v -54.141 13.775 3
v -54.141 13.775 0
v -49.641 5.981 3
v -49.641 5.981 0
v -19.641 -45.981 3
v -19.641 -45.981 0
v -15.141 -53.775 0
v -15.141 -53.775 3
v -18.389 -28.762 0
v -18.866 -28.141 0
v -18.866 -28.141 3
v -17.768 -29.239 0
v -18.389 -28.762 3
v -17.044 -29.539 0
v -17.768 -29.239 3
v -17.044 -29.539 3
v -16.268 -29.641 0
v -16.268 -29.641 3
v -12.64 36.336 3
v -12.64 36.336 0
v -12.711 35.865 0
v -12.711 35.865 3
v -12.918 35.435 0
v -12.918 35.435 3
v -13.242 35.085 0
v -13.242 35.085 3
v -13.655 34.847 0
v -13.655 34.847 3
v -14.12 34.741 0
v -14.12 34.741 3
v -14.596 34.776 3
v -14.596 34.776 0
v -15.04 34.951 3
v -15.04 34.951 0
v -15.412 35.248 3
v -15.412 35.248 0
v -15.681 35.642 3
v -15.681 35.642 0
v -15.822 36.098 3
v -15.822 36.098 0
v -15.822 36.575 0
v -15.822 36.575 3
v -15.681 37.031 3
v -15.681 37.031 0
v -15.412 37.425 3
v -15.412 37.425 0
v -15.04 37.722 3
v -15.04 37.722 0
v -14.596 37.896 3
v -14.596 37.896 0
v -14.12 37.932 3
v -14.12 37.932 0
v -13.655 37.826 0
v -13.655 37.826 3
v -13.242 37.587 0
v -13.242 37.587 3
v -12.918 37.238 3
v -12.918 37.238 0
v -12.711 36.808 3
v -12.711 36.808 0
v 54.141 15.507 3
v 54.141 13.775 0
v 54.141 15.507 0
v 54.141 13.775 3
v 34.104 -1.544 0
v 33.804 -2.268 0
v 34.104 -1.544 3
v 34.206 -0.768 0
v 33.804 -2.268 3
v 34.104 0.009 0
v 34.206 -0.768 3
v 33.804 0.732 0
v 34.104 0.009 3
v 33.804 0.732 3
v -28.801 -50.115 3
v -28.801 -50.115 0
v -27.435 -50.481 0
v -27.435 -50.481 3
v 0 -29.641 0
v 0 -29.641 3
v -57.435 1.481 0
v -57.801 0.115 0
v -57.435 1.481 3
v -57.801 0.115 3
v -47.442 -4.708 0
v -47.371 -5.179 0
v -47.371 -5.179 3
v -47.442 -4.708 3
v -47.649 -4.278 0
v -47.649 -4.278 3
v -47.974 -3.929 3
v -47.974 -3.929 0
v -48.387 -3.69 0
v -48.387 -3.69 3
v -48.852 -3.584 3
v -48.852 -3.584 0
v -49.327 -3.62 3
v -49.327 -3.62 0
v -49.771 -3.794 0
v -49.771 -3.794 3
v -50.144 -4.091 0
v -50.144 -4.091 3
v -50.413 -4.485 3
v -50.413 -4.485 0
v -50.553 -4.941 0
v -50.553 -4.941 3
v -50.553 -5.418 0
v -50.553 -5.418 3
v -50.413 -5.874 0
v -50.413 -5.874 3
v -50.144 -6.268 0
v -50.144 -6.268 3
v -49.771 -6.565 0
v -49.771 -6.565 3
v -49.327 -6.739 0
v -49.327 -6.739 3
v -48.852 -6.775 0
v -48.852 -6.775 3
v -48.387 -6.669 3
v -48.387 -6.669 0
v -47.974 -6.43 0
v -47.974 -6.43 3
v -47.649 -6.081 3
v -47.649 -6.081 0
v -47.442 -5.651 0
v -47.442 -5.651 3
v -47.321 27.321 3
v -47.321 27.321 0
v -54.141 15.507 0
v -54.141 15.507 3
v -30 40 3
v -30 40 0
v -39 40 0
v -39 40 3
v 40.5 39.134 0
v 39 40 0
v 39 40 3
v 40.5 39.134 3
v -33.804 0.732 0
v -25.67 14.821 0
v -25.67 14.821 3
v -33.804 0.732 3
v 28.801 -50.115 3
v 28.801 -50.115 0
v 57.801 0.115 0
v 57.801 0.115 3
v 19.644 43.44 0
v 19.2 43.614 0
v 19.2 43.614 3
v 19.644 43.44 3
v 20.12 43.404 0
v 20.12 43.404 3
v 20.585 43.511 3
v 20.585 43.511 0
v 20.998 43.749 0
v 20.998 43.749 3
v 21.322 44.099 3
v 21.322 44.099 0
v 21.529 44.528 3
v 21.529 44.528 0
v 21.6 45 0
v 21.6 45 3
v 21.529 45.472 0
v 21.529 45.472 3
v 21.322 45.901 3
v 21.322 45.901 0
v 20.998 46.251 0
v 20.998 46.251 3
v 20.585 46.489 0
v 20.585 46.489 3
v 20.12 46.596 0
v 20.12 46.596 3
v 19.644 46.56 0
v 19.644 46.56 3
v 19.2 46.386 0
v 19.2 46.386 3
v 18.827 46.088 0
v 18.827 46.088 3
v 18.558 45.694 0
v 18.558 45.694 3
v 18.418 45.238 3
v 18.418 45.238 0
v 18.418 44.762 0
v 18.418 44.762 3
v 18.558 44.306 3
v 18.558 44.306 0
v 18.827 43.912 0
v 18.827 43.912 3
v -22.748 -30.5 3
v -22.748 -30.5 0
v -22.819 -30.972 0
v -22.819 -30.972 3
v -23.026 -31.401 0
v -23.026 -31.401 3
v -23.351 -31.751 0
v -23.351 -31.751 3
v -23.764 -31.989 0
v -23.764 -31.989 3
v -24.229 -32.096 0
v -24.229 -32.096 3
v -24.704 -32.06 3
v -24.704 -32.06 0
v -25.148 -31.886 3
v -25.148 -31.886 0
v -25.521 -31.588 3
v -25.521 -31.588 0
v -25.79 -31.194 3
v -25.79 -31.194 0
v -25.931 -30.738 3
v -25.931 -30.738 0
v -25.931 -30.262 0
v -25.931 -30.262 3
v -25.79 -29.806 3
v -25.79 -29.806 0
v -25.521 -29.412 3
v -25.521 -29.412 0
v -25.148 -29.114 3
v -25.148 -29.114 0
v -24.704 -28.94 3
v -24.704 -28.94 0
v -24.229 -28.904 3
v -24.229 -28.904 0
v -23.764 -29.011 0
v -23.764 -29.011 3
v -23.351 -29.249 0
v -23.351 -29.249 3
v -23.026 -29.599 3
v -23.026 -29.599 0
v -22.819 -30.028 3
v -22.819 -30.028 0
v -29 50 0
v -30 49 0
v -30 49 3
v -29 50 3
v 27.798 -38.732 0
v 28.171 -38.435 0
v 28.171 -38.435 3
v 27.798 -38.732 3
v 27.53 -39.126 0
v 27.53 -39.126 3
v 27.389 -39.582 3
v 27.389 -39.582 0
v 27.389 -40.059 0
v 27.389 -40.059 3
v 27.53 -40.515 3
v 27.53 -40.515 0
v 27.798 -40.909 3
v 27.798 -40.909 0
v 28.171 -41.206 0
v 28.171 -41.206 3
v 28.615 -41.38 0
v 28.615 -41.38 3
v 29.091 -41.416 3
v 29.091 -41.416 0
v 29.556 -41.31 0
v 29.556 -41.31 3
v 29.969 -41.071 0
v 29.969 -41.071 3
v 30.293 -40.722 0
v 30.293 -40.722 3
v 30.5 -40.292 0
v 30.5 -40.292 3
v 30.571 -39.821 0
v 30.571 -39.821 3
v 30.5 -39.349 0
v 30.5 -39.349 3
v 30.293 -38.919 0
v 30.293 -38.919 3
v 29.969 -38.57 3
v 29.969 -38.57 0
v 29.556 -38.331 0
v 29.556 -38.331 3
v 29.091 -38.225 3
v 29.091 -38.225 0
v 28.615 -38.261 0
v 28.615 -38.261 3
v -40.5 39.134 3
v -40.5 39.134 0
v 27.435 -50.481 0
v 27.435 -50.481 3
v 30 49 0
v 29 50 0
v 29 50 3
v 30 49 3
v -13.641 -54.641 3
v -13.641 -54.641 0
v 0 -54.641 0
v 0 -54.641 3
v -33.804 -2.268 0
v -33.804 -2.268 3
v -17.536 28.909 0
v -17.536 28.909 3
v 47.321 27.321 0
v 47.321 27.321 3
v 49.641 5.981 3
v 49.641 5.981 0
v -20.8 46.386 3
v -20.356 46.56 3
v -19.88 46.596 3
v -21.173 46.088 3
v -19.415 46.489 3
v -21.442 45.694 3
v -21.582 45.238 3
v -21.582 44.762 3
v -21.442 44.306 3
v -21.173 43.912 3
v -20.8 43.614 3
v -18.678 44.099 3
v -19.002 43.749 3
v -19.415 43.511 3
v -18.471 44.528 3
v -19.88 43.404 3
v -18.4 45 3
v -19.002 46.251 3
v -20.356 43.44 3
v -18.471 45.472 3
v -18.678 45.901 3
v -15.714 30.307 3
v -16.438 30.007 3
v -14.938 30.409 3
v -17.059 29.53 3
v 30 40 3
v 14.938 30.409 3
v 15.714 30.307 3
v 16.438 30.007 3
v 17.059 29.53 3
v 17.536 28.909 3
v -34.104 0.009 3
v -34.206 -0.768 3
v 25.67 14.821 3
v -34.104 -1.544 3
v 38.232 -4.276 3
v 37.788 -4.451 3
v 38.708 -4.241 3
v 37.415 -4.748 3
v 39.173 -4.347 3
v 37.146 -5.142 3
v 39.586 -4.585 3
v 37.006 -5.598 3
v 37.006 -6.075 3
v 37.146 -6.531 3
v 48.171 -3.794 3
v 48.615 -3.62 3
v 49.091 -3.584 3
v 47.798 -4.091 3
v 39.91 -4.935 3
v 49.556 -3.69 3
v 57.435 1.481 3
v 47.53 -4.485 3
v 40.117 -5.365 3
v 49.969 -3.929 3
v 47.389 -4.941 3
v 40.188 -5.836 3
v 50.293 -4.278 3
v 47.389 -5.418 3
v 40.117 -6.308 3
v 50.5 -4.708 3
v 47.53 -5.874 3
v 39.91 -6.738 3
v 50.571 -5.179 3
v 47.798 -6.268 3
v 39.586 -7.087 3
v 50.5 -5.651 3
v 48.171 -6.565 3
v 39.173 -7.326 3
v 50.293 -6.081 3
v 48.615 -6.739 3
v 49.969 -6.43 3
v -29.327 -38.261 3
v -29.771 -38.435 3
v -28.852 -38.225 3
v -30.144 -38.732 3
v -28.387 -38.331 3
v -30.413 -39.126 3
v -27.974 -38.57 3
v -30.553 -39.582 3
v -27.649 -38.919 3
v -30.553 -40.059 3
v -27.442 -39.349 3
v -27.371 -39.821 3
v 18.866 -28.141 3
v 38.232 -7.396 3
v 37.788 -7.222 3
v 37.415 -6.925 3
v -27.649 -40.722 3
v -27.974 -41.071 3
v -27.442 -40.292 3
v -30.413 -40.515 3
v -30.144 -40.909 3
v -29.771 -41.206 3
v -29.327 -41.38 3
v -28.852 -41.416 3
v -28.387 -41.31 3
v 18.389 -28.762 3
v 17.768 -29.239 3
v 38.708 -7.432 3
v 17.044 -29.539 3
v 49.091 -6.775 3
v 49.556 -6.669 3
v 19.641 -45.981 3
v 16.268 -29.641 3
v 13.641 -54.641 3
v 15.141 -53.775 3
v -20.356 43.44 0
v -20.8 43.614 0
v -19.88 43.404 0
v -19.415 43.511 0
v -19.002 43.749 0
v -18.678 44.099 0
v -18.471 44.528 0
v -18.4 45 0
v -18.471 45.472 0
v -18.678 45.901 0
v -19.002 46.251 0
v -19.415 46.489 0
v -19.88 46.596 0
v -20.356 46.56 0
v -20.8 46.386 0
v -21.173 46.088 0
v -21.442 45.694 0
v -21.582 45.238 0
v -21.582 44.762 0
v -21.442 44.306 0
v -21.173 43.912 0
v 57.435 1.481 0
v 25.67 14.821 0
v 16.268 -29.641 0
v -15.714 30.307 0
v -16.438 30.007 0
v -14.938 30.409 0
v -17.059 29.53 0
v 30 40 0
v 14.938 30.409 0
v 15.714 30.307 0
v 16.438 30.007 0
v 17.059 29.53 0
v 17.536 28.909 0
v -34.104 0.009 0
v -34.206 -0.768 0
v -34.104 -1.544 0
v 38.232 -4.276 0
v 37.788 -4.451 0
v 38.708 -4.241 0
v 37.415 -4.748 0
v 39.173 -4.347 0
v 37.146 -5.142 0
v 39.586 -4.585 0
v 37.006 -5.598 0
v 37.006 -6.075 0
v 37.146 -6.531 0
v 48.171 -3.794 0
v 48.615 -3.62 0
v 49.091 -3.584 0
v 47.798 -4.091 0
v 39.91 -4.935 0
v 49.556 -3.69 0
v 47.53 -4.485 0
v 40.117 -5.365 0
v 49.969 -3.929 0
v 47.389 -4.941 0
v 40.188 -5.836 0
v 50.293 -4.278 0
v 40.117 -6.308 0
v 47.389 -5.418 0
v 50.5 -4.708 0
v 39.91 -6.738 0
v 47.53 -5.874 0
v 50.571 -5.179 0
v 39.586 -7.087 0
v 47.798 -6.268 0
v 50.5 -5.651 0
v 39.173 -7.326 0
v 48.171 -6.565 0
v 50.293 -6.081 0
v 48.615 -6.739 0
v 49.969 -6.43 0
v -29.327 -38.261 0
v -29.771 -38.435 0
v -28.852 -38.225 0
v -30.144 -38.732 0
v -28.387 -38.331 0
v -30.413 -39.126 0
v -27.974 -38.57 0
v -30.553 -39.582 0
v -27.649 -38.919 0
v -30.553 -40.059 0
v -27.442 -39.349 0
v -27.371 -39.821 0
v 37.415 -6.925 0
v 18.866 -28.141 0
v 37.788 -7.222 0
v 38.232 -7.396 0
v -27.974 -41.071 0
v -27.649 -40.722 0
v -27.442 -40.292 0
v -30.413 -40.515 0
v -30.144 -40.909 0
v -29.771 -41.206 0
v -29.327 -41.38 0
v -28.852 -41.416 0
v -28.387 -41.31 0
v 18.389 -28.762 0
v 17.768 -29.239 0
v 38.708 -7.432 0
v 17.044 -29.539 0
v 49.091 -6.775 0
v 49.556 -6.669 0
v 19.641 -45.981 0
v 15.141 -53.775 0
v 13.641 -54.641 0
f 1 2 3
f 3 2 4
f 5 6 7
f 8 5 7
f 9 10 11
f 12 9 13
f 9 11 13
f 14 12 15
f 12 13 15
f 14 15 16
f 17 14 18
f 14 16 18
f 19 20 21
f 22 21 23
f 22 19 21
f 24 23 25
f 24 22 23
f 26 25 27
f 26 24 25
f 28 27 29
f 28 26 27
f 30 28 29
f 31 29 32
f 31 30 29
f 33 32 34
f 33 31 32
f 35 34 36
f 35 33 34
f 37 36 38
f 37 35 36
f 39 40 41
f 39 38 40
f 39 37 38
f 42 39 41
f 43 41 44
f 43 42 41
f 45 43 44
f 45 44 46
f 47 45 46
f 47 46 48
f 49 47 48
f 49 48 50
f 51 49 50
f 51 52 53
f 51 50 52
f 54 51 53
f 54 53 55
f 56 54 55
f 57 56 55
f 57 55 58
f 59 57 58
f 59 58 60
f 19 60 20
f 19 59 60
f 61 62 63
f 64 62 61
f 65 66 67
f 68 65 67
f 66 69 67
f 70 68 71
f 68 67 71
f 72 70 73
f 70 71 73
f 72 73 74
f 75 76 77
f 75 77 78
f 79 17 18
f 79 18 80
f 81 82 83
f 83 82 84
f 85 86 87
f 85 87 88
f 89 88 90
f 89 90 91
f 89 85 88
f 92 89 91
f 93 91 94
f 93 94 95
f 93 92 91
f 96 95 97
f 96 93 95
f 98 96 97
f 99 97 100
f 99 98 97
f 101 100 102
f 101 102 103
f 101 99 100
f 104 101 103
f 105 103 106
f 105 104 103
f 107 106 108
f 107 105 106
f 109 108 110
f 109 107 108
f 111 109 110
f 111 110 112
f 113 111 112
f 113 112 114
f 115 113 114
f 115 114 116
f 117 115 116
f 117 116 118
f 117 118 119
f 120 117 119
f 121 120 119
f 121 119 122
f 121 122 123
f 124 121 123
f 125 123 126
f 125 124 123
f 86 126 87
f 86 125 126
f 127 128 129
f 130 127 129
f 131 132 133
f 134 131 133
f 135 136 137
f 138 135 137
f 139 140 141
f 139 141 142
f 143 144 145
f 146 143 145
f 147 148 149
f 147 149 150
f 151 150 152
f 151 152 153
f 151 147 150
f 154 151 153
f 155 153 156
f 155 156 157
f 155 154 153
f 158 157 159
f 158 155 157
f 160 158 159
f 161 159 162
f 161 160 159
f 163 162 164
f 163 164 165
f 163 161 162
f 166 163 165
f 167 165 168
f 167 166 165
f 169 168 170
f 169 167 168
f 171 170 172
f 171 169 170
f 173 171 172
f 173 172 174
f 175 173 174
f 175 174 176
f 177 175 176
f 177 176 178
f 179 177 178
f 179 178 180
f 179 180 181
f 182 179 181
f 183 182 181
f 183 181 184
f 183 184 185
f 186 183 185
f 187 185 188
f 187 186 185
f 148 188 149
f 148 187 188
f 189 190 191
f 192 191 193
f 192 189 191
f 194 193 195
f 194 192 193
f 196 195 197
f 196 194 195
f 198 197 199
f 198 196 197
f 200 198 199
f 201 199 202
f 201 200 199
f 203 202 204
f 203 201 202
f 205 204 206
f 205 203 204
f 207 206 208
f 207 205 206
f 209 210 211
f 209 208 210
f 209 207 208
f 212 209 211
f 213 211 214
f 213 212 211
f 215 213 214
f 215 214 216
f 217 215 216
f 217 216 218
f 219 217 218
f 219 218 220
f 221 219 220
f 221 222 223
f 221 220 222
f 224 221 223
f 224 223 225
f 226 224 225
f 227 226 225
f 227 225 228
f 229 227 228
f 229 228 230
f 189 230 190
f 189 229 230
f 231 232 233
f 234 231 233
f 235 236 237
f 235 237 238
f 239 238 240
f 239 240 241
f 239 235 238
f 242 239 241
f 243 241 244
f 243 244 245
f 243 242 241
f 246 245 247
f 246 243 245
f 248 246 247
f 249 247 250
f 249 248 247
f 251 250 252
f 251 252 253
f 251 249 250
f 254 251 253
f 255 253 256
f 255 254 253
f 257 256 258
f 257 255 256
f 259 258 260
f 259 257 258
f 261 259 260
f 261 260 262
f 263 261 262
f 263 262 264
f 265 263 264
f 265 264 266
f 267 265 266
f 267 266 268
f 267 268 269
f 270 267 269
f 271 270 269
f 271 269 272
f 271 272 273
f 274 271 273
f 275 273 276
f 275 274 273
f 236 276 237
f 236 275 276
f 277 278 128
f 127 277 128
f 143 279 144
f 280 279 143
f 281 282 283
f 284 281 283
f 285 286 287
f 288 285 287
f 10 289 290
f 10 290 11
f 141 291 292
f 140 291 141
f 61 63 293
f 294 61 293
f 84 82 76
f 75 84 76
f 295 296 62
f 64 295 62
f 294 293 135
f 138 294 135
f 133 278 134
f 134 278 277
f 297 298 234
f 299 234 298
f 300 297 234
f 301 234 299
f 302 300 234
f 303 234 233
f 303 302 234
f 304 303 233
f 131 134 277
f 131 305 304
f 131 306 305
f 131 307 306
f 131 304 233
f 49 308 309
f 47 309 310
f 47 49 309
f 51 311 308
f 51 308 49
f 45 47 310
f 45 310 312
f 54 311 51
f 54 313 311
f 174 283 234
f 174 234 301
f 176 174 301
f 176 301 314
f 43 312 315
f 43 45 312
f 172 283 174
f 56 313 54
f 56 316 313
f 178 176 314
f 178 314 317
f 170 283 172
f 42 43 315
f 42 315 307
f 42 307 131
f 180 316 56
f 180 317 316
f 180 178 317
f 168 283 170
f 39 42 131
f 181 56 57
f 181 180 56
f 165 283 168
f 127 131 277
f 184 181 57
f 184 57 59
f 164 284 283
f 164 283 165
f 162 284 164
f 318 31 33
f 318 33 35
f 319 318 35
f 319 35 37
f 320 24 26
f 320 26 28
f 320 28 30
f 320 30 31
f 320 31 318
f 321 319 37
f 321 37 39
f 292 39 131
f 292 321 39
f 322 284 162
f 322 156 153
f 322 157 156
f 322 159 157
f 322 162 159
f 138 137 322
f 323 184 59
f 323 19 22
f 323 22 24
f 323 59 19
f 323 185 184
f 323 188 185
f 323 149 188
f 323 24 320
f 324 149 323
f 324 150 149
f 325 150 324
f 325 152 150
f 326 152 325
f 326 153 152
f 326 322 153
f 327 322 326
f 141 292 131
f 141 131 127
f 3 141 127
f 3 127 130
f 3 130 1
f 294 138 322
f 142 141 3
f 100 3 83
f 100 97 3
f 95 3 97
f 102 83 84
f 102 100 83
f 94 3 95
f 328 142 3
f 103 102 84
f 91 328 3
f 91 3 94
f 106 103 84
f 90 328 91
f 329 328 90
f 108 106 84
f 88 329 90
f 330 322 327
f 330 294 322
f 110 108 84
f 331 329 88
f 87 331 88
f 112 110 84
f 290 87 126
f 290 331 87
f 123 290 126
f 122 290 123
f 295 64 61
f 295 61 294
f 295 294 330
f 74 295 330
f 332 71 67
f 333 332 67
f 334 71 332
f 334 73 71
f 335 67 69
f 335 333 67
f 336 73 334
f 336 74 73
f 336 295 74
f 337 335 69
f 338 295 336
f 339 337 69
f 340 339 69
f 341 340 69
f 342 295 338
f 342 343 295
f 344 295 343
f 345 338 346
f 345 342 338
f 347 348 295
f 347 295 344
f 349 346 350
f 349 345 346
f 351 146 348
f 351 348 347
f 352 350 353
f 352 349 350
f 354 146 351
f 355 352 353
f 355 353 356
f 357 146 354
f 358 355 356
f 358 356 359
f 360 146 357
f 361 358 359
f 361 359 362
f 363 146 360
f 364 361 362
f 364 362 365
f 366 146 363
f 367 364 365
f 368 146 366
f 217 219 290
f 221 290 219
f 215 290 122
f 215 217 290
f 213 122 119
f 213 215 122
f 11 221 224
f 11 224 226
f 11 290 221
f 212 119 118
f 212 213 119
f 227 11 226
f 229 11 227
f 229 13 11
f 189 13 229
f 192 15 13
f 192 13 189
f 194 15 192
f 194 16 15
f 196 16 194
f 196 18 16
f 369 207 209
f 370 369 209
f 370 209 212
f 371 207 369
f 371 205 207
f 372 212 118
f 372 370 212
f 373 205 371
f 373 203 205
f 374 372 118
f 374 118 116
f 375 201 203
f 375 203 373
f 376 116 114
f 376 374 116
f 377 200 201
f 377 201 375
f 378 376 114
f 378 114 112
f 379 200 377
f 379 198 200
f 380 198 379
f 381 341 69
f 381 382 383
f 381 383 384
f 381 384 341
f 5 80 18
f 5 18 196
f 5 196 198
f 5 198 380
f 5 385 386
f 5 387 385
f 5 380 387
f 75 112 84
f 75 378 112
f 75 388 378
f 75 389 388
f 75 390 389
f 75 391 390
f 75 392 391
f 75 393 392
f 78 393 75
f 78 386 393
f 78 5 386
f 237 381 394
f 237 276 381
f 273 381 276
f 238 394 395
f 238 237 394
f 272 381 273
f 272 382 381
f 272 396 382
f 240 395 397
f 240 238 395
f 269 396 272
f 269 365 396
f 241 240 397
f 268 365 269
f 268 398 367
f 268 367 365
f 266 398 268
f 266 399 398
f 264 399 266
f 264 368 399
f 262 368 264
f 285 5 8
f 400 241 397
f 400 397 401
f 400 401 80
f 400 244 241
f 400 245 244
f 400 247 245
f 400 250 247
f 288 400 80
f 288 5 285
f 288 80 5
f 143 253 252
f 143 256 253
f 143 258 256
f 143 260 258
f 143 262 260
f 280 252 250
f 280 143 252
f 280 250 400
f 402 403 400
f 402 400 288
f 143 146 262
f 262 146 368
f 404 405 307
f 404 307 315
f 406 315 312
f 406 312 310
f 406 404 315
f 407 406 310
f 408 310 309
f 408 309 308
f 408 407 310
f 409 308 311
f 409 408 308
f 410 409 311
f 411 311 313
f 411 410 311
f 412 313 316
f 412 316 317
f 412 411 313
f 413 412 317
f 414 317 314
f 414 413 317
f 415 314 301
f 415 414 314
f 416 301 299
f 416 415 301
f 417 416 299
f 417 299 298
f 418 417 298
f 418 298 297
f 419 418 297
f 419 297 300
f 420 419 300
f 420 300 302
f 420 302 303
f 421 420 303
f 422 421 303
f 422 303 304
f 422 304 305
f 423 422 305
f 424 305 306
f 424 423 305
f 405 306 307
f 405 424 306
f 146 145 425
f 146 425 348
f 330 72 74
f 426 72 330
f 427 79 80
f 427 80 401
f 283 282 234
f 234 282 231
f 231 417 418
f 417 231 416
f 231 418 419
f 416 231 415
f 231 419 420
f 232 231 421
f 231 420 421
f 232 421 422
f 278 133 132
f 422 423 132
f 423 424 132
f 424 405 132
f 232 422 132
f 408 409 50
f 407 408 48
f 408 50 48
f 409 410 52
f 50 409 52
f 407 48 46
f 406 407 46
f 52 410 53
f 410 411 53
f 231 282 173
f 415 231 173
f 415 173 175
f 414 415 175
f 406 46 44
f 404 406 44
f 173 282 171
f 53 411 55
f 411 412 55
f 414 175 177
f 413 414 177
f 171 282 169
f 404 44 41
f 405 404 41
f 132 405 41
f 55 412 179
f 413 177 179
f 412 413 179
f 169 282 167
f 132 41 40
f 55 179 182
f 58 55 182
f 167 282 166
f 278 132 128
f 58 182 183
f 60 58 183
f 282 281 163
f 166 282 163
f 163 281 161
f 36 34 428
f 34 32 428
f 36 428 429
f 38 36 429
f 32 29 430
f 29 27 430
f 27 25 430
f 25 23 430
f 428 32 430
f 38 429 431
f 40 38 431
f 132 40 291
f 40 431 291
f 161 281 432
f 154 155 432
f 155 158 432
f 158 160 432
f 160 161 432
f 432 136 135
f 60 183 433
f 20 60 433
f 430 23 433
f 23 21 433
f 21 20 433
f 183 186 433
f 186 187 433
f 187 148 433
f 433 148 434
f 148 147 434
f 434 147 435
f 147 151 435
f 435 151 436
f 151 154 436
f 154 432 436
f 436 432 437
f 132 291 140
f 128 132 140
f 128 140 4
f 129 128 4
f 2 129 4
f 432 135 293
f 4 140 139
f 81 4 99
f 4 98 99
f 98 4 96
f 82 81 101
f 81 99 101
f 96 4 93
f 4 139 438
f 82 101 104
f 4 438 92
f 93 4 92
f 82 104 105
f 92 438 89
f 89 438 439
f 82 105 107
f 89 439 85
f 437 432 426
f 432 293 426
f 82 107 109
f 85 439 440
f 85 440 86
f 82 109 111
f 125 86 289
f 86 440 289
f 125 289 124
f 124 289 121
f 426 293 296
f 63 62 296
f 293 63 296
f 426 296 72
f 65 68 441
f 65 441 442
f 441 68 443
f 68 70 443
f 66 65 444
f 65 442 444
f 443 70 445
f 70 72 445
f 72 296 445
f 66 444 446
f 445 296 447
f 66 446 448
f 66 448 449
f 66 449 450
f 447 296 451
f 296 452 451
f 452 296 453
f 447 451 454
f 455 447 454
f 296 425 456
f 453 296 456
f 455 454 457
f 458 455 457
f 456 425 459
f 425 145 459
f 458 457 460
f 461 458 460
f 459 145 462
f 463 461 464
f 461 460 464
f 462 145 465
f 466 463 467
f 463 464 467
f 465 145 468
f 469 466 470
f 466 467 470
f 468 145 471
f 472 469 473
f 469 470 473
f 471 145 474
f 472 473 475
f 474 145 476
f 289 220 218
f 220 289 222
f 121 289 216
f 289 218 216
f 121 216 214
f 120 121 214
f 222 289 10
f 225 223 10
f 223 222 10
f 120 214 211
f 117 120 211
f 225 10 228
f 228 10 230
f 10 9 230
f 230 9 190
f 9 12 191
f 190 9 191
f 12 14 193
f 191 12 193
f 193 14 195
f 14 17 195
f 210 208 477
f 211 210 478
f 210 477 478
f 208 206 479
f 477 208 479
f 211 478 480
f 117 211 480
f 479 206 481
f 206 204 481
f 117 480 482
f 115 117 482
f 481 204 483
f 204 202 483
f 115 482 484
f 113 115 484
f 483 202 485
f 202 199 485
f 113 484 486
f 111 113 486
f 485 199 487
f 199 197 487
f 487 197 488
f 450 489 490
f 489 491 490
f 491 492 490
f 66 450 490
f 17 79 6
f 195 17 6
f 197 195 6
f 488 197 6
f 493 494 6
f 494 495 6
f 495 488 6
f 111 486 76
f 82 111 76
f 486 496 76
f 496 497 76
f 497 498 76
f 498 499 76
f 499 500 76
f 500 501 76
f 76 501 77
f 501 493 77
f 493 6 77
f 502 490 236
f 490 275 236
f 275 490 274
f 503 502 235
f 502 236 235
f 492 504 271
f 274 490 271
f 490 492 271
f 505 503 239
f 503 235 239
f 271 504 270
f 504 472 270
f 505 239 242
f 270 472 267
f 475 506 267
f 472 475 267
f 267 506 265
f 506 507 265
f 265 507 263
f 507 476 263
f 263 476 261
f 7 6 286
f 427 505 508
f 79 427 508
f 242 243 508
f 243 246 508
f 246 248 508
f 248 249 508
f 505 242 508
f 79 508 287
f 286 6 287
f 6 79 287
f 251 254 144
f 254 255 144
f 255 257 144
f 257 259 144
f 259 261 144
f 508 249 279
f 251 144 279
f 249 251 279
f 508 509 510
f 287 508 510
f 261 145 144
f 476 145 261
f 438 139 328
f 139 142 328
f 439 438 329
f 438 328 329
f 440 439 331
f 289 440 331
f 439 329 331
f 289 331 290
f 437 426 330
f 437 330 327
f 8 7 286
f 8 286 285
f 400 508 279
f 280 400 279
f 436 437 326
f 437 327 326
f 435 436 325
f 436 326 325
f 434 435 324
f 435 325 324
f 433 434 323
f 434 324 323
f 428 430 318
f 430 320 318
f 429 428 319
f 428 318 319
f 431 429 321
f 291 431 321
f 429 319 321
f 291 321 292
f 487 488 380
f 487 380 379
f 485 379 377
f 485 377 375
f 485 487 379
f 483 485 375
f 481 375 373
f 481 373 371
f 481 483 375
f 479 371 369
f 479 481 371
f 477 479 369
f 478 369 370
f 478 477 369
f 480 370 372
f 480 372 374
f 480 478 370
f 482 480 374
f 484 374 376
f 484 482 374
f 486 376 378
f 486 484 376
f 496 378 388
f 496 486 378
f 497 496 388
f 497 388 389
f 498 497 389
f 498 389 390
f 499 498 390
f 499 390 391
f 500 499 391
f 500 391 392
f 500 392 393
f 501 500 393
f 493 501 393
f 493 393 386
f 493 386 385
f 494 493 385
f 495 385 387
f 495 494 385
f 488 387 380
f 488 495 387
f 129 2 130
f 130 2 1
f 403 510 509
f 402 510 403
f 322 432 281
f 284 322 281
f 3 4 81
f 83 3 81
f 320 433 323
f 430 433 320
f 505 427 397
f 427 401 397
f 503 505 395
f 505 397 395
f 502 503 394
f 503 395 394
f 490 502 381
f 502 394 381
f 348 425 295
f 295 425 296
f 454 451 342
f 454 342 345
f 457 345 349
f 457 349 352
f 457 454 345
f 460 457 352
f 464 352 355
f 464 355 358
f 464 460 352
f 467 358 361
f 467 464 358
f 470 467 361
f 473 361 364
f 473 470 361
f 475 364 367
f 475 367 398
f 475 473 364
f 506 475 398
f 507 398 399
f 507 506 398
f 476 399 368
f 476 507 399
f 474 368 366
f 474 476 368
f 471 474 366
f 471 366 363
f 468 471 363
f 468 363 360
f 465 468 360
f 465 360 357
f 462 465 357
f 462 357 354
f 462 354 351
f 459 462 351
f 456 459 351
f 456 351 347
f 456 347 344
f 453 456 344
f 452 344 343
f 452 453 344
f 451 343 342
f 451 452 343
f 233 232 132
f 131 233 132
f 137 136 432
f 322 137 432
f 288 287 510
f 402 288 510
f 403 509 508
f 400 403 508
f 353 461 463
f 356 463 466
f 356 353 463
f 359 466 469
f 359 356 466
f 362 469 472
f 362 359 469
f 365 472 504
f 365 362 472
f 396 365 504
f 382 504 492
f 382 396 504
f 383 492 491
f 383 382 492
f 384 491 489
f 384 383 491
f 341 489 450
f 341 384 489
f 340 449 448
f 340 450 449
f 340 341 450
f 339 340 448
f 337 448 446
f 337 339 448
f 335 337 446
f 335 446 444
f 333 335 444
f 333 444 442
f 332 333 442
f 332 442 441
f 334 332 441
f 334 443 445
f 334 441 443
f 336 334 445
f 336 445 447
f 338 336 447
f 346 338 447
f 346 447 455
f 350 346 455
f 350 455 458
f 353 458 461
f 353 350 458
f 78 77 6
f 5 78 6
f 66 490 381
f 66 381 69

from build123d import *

# Parameters (mm, degrees)
SKETCH_R              = 1.6
PAD_DEPTH             = 3
POLARPATTERN_COUNT    = 3
POCKET_DEPTH          = 316.40103
POLARPATTERN001_COUNT = 3
CHAMFER_SIZE          = 1
FILLET_R              = 3
SKETCH066_R           = 1.6
POCKET032_DEPTH       = 3.001


with BuildPart() as part:
    # Sketch → Pad (new body)
    with BuildSketch(Plane.XY):
        Polygon((0, 0), (-47.320508, 27.320508), (-54.641016, 14.641016), (-49.641016, 5.980762), (-58.30127, 0.980762), (-28.30127, -50.980762), (-19.641016, -45.980762), (-14.641016, -54.641016), (0, -54.641016), align=None)
        with Locations((-48.971143, -5.179492)):
            Circle(SKETCH_R, mode=Mode.SUBTRACT)
        with Locations((-28.971143, -39.820508)):
            Circle(SKETCH_R, mode=Mode.SUBTRACT)
    pad = extrude(amount=PAD_DEPTH)

    # PolarPattern: Pad ×3 about axis
    polarpattern_axis = Axis((0, 0, 0), (0, 0, 1))
    for i in range(1, POLARPATTERN_COUNT):
        add(pad.rotate(polarpattern_axis, i * 360 / POLARPATTERN_COUNT))

    # Sketch001 → Pocket (cut, through all)
    with BuildSketch(Plane.XY):
        Polygon((-25.669873, 14.820508), (-34.669873, -0.767949), (-18, -29.641016), (0, -29.641016), (0, 0), align=None)
    pocket = extrude(amount=POCKET_DEPTH, mode=Mode.SUBTRACT)

    # PolarPattern001: Pocket ×3 about axis
    polarpattern001_axis = Axis((0, 0, 0), (0, 0, 1))
    for i in range(1, POLARPATTERN001_COUNT):
        add(pocket.rotate(polarpattern001_axis, i * 360 / POLARPATTERN001_COUNT), mode=Mode.SUBTRACT)

    # Chamfer
    chamfer_edges = [part.edges().sort_by_distance(p)[0] for p in [
        (-54.641016, 14.641016, 1.5),
        (-40, 40, 1.5),
        (-30, 50, 1.5),
        (30, 50, 1.5),
        (40, 40, 1.5),
        (54.641016, 14.641016, 1.5),
        (58.30127, 0.980762, 1.5),
        (28.30127, -50.980762, 1.5),
        (14.641016, -54.641016, 1.5),
        (-14.641016, -54.641016, 1.5),
        (-28.30127, -50.980762, 1.5),
        (-58.30127, 0.980762, 1.5),
    ]]
    chamfer(chamfer_edges, length=CHAMFER_SIZE)

    # Fillet
    fillet_edges = [part.edges().sort_by_distance(p)[0] for p in [
        (-16.669873, 30.408965, 1.5),
        (18, -29.641016, 1.5),
        (-18, -29.641016, 1.5),
        (34.669873, -0.767949, 1.5),
        (16.669873, 30.408965, 1.5),
        (-34.669873, -0.767949, 1.5),
    ]]
    fillet(fillet_edges, radius=FILLET_R)

    # Sketch066 (on Binder) → Pocket032 (cut, through all)
    with BuildSketch(Plane(origin=(0, 0, 3), x_dir=(1, 0, 0), z_dir=(0, 0, -1))):
        with Locations((-24.348373, 30.5)):
            Circle(SKETCH066_R)
        with Locations((38.587961, 5.836309)):
            Circle(SKETCH066_R)
        with Locations((-14.239588, -36.336309)):
            Circle(SKETCH066_R)
    extrude(amount=POCKET032_DEPTH, mode=Mode.SUBTRACT)


solid = part.part
